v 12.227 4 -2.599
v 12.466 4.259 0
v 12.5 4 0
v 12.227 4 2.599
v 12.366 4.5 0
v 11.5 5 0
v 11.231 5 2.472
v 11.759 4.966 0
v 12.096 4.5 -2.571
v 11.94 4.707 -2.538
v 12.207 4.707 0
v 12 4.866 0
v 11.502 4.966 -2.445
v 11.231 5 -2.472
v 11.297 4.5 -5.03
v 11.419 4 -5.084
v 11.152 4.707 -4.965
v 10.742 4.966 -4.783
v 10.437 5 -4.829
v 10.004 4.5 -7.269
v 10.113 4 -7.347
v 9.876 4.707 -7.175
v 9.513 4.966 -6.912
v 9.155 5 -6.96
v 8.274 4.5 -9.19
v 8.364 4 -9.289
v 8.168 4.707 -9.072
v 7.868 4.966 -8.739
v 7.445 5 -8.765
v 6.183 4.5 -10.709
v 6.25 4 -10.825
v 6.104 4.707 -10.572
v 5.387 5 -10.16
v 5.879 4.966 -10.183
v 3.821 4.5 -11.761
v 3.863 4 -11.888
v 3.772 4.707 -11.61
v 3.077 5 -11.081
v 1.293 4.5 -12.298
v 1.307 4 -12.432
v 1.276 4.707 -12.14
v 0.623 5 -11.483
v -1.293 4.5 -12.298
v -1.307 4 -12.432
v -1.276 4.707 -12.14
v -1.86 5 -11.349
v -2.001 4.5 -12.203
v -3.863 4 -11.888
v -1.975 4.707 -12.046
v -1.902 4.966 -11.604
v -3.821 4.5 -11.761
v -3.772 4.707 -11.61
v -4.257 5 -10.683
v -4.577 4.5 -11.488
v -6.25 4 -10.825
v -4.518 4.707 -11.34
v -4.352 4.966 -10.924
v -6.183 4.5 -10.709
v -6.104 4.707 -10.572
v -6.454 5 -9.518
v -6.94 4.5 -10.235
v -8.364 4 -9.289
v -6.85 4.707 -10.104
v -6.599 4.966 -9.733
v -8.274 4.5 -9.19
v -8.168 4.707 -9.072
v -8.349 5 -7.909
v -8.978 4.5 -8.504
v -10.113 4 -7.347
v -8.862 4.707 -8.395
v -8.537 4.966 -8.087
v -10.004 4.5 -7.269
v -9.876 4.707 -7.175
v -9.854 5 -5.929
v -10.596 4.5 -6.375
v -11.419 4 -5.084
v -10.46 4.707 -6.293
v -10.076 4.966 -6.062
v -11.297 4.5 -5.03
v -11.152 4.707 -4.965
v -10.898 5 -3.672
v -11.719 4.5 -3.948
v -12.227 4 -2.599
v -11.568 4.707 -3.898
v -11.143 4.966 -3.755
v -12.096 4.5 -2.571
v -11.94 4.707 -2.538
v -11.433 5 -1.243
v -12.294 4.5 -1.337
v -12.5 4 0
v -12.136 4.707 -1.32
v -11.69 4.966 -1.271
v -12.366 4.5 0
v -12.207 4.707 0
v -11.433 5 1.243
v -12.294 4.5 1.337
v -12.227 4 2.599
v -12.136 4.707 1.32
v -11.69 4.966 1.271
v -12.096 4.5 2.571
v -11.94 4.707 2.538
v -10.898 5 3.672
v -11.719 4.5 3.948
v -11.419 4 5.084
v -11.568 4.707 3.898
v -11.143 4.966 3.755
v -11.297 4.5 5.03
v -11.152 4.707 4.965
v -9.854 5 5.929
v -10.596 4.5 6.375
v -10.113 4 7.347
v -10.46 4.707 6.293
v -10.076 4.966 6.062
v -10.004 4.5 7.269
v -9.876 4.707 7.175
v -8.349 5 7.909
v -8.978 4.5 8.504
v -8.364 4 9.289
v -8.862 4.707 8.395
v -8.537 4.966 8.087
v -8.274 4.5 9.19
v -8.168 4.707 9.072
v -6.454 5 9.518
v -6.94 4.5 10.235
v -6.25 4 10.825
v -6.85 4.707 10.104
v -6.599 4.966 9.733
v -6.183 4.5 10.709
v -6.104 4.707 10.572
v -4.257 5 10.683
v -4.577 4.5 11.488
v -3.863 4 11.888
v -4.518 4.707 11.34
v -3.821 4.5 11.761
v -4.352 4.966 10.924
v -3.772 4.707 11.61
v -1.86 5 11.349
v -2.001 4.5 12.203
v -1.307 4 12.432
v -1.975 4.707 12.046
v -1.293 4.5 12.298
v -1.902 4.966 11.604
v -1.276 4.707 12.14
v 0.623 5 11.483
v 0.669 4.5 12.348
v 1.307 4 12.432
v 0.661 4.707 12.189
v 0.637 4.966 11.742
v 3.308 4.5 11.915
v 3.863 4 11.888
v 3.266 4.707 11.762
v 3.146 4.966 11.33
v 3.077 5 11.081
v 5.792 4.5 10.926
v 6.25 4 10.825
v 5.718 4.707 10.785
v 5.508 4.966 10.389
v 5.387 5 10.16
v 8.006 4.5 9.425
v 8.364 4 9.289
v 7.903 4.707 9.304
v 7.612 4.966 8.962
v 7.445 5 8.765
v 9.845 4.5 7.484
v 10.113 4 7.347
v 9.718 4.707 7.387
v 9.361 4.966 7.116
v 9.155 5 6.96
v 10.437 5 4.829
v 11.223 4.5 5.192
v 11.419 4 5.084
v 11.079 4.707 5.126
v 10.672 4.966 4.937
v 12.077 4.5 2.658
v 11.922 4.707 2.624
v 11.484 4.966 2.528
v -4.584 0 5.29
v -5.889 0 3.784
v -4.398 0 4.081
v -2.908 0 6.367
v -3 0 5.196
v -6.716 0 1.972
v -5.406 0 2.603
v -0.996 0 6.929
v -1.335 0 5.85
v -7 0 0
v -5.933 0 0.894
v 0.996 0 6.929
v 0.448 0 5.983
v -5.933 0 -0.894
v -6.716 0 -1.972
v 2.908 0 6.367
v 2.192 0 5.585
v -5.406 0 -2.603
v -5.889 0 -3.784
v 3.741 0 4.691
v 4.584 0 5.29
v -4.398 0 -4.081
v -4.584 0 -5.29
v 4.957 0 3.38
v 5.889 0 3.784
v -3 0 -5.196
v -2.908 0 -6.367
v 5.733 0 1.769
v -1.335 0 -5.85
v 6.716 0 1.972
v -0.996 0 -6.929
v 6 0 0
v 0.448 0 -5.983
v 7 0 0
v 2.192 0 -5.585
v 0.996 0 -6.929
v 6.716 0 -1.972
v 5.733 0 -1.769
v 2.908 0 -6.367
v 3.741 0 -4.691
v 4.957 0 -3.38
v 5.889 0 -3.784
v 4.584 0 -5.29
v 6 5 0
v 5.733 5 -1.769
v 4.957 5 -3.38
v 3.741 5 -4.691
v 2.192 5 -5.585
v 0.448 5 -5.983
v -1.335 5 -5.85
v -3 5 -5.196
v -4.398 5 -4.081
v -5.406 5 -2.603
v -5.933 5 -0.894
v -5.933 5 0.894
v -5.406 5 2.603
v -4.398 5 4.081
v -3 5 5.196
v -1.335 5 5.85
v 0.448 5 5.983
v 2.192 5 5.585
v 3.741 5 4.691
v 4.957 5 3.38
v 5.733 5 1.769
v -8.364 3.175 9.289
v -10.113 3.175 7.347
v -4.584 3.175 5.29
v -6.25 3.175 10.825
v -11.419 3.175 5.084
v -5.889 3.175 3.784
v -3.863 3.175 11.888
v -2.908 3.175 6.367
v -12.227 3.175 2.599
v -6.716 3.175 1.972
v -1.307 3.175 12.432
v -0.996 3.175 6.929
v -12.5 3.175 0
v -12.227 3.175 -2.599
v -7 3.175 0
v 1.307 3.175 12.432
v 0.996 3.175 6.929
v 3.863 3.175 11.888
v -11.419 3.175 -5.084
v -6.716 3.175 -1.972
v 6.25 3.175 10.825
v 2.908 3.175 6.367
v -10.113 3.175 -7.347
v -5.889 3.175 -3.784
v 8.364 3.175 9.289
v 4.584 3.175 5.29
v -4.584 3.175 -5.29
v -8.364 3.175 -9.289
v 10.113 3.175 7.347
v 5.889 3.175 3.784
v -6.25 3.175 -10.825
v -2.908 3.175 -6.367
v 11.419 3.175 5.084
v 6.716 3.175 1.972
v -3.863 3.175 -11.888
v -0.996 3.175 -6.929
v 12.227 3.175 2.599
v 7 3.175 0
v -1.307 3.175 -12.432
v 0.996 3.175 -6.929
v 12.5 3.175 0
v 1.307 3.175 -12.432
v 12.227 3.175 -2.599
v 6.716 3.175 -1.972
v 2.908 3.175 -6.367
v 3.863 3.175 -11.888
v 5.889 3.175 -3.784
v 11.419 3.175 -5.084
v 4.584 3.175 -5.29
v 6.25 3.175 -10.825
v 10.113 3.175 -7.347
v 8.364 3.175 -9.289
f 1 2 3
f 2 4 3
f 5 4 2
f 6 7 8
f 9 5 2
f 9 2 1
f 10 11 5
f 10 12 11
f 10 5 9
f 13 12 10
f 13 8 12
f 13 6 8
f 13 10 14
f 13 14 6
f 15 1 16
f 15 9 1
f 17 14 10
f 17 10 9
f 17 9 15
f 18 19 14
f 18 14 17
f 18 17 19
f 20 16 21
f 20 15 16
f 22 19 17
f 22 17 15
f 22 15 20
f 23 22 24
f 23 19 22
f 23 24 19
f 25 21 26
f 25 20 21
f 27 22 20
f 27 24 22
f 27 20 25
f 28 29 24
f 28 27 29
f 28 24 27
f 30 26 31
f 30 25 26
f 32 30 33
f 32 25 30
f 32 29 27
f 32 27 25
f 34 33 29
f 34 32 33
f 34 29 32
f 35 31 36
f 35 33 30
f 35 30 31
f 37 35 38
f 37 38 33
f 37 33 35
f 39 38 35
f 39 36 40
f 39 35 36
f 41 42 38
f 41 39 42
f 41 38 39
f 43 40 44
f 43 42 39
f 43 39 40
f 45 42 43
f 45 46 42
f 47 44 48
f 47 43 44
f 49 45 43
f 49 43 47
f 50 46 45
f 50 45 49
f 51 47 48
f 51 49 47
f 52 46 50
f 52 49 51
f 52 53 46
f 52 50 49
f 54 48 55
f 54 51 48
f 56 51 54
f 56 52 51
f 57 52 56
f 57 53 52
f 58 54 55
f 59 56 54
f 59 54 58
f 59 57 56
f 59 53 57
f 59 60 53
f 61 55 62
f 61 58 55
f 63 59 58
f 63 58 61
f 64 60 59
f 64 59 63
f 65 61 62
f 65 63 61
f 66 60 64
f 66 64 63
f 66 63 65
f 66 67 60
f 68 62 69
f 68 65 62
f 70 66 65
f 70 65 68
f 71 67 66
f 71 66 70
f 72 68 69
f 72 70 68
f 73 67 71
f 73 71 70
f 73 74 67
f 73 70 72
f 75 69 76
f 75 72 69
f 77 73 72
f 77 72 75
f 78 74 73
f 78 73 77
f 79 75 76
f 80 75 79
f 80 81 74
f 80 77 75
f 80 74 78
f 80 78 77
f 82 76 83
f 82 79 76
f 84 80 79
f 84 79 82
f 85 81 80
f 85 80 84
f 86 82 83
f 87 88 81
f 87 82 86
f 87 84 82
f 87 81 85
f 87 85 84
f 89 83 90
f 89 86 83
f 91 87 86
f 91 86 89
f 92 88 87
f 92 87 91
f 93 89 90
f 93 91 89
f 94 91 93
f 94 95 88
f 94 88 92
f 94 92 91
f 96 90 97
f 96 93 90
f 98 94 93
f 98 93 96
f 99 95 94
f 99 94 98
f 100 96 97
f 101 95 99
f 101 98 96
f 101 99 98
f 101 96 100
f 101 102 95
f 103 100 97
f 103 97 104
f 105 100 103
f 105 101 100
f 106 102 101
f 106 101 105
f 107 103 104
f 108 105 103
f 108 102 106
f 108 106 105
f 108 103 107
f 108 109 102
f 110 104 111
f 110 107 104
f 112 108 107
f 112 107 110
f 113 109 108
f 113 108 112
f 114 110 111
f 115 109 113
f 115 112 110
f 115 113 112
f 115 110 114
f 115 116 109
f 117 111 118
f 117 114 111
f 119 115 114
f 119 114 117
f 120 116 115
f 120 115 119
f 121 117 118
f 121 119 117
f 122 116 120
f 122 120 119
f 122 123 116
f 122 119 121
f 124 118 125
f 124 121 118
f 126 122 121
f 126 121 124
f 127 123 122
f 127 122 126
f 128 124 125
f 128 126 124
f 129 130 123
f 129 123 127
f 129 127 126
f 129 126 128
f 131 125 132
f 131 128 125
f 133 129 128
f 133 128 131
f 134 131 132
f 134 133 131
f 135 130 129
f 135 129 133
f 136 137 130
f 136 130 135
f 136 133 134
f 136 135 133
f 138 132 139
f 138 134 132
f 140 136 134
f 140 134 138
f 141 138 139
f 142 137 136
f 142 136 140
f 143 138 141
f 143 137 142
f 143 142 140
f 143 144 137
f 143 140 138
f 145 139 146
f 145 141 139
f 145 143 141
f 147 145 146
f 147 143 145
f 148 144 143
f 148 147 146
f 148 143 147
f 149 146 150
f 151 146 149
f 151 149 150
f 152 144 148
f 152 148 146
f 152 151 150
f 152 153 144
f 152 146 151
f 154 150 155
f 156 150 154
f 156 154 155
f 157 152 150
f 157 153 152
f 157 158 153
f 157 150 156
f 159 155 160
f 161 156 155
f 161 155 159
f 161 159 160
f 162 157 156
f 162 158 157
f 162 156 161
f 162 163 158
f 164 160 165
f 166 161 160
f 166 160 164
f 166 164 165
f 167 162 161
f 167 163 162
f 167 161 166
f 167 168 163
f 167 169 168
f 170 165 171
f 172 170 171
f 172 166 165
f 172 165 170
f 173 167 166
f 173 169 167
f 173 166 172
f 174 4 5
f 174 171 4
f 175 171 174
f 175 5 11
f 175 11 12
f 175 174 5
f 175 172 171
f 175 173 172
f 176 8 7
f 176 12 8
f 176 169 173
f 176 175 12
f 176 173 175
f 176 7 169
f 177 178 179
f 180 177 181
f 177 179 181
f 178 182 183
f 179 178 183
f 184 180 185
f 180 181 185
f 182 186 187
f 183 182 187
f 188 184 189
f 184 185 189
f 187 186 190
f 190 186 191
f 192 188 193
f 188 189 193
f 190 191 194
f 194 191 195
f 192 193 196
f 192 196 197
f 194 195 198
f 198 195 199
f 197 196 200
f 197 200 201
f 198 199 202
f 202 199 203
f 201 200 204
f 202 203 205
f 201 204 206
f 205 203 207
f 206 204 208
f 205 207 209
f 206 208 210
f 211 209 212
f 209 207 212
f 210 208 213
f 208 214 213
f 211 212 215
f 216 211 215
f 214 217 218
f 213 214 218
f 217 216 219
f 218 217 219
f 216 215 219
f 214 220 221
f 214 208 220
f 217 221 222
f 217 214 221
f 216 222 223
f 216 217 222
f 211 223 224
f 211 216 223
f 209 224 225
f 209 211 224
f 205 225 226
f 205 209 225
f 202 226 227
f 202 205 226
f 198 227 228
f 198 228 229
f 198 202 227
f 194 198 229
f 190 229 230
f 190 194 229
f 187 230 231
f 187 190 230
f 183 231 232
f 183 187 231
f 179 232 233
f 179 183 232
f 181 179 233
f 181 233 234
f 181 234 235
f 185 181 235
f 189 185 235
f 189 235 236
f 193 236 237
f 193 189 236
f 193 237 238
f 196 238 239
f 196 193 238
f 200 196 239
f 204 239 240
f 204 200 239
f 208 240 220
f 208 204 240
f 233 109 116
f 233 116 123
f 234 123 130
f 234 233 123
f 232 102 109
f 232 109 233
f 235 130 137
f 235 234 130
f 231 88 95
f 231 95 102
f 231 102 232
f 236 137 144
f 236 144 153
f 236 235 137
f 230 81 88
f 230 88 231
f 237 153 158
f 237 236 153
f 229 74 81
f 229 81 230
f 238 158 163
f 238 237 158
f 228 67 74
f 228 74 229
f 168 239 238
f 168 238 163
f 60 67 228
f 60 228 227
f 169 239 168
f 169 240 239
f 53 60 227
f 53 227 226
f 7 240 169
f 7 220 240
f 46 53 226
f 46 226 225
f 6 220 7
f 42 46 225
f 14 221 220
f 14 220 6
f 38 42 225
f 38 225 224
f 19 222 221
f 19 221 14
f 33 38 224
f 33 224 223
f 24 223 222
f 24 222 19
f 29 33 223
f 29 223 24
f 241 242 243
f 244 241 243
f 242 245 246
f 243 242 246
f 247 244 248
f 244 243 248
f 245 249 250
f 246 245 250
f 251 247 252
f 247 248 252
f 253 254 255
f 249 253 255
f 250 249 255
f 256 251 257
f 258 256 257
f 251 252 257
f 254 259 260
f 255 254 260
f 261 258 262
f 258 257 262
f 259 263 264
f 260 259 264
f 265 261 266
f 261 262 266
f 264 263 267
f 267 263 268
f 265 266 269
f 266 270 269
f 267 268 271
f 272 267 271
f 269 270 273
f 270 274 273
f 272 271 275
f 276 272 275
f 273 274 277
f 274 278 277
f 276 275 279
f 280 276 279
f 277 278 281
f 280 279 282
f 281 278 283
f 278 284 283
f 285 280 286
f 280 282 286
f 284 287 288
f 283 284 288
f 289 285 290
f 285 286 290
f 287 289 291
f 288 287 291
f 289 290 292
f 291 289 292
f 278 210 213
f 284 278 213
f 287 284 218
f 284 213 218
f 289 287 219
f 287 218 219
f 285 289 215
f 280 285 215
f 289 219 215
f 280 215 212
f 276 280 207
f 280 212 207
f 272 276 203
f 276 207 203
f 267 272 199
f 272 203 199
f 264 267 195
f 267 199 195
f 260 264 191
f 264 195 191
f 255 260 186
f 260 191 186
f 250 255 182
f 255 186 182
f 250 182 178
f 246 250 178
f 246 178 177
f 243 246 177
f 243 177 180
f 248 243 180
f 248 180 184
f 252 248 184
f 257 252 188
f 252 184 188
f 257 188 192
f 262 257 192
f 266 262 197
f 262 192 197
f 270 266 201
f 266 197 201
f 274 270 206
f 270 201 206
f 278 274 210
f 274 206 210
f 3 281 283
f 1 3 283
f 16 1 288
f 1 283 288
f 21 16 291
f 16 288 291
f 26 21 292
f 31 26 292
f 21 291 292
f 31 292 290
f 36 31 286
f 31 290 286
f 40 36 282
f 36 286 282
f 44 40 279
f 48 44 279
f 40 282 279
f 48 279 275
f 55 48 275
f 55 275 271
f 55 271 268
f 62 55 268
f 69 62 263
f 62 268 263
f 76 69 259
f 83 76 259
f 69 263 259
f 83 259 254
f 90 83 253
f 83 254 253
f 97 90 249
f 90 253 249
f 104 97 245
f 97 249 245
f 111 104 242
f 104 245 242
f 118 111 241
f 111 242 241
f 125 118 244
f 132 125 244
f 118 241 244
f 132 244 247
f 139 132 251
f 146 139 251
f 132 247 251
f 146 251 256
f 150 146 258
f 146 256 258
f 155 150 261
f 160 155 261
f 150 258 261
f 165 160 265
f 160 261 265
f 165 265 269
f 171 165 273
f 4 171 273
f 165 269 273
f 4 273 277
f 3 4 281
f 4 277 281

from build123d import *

# Parameters (mm, degrees)
SKETCH1_R           = 7
SKETCH1_R_2         = 6
BOSS_EXTRUDE1_DEPTH = 3.175
SKETCH2_R           = 12.5
SKETCH2_R_2         = 6
BOSS_EXTRUDE2_DEPTH = 1.825
FILLET1_R           = 1


with BuildPart() as part:
    # Sketch1 → Boss-Extrude1 (new body)
    with BuildSketch(Plane(origin=(0, 0, 0), x_dir=(1, 0, 0), z_dir=(0, 1, 0))):
        Circle(SKETCH1_R)
        Circle(SKETCH1_R_2, mode=Mode.SUBTRACT)
    extrude(amount=BOSS_EXTRUDE1_DEPTH)

    # Sketch2 → Boss-Extrude2 (add)
    with BuildSketch(Plane(origin=(0, 3.175, 0), x_dir=(1, 0, 0), z_dir=(0, 1, 0))):
        Circle(SKETCH2_R)
        Circle(SKETCH2_R_2, mode=Mode.SUBTRACT)
    extrude(amount=BOSS_EXTRUDE2_DEPTH)

    # Fillet1
    fillet1_edges = [part.edges().sort_by_distance(p)[0] for p in [
        (-12.5, 5, 0),
    ]]
    fillet(fillet1_edges, radius=FILLET1_R)


solid = part.part
